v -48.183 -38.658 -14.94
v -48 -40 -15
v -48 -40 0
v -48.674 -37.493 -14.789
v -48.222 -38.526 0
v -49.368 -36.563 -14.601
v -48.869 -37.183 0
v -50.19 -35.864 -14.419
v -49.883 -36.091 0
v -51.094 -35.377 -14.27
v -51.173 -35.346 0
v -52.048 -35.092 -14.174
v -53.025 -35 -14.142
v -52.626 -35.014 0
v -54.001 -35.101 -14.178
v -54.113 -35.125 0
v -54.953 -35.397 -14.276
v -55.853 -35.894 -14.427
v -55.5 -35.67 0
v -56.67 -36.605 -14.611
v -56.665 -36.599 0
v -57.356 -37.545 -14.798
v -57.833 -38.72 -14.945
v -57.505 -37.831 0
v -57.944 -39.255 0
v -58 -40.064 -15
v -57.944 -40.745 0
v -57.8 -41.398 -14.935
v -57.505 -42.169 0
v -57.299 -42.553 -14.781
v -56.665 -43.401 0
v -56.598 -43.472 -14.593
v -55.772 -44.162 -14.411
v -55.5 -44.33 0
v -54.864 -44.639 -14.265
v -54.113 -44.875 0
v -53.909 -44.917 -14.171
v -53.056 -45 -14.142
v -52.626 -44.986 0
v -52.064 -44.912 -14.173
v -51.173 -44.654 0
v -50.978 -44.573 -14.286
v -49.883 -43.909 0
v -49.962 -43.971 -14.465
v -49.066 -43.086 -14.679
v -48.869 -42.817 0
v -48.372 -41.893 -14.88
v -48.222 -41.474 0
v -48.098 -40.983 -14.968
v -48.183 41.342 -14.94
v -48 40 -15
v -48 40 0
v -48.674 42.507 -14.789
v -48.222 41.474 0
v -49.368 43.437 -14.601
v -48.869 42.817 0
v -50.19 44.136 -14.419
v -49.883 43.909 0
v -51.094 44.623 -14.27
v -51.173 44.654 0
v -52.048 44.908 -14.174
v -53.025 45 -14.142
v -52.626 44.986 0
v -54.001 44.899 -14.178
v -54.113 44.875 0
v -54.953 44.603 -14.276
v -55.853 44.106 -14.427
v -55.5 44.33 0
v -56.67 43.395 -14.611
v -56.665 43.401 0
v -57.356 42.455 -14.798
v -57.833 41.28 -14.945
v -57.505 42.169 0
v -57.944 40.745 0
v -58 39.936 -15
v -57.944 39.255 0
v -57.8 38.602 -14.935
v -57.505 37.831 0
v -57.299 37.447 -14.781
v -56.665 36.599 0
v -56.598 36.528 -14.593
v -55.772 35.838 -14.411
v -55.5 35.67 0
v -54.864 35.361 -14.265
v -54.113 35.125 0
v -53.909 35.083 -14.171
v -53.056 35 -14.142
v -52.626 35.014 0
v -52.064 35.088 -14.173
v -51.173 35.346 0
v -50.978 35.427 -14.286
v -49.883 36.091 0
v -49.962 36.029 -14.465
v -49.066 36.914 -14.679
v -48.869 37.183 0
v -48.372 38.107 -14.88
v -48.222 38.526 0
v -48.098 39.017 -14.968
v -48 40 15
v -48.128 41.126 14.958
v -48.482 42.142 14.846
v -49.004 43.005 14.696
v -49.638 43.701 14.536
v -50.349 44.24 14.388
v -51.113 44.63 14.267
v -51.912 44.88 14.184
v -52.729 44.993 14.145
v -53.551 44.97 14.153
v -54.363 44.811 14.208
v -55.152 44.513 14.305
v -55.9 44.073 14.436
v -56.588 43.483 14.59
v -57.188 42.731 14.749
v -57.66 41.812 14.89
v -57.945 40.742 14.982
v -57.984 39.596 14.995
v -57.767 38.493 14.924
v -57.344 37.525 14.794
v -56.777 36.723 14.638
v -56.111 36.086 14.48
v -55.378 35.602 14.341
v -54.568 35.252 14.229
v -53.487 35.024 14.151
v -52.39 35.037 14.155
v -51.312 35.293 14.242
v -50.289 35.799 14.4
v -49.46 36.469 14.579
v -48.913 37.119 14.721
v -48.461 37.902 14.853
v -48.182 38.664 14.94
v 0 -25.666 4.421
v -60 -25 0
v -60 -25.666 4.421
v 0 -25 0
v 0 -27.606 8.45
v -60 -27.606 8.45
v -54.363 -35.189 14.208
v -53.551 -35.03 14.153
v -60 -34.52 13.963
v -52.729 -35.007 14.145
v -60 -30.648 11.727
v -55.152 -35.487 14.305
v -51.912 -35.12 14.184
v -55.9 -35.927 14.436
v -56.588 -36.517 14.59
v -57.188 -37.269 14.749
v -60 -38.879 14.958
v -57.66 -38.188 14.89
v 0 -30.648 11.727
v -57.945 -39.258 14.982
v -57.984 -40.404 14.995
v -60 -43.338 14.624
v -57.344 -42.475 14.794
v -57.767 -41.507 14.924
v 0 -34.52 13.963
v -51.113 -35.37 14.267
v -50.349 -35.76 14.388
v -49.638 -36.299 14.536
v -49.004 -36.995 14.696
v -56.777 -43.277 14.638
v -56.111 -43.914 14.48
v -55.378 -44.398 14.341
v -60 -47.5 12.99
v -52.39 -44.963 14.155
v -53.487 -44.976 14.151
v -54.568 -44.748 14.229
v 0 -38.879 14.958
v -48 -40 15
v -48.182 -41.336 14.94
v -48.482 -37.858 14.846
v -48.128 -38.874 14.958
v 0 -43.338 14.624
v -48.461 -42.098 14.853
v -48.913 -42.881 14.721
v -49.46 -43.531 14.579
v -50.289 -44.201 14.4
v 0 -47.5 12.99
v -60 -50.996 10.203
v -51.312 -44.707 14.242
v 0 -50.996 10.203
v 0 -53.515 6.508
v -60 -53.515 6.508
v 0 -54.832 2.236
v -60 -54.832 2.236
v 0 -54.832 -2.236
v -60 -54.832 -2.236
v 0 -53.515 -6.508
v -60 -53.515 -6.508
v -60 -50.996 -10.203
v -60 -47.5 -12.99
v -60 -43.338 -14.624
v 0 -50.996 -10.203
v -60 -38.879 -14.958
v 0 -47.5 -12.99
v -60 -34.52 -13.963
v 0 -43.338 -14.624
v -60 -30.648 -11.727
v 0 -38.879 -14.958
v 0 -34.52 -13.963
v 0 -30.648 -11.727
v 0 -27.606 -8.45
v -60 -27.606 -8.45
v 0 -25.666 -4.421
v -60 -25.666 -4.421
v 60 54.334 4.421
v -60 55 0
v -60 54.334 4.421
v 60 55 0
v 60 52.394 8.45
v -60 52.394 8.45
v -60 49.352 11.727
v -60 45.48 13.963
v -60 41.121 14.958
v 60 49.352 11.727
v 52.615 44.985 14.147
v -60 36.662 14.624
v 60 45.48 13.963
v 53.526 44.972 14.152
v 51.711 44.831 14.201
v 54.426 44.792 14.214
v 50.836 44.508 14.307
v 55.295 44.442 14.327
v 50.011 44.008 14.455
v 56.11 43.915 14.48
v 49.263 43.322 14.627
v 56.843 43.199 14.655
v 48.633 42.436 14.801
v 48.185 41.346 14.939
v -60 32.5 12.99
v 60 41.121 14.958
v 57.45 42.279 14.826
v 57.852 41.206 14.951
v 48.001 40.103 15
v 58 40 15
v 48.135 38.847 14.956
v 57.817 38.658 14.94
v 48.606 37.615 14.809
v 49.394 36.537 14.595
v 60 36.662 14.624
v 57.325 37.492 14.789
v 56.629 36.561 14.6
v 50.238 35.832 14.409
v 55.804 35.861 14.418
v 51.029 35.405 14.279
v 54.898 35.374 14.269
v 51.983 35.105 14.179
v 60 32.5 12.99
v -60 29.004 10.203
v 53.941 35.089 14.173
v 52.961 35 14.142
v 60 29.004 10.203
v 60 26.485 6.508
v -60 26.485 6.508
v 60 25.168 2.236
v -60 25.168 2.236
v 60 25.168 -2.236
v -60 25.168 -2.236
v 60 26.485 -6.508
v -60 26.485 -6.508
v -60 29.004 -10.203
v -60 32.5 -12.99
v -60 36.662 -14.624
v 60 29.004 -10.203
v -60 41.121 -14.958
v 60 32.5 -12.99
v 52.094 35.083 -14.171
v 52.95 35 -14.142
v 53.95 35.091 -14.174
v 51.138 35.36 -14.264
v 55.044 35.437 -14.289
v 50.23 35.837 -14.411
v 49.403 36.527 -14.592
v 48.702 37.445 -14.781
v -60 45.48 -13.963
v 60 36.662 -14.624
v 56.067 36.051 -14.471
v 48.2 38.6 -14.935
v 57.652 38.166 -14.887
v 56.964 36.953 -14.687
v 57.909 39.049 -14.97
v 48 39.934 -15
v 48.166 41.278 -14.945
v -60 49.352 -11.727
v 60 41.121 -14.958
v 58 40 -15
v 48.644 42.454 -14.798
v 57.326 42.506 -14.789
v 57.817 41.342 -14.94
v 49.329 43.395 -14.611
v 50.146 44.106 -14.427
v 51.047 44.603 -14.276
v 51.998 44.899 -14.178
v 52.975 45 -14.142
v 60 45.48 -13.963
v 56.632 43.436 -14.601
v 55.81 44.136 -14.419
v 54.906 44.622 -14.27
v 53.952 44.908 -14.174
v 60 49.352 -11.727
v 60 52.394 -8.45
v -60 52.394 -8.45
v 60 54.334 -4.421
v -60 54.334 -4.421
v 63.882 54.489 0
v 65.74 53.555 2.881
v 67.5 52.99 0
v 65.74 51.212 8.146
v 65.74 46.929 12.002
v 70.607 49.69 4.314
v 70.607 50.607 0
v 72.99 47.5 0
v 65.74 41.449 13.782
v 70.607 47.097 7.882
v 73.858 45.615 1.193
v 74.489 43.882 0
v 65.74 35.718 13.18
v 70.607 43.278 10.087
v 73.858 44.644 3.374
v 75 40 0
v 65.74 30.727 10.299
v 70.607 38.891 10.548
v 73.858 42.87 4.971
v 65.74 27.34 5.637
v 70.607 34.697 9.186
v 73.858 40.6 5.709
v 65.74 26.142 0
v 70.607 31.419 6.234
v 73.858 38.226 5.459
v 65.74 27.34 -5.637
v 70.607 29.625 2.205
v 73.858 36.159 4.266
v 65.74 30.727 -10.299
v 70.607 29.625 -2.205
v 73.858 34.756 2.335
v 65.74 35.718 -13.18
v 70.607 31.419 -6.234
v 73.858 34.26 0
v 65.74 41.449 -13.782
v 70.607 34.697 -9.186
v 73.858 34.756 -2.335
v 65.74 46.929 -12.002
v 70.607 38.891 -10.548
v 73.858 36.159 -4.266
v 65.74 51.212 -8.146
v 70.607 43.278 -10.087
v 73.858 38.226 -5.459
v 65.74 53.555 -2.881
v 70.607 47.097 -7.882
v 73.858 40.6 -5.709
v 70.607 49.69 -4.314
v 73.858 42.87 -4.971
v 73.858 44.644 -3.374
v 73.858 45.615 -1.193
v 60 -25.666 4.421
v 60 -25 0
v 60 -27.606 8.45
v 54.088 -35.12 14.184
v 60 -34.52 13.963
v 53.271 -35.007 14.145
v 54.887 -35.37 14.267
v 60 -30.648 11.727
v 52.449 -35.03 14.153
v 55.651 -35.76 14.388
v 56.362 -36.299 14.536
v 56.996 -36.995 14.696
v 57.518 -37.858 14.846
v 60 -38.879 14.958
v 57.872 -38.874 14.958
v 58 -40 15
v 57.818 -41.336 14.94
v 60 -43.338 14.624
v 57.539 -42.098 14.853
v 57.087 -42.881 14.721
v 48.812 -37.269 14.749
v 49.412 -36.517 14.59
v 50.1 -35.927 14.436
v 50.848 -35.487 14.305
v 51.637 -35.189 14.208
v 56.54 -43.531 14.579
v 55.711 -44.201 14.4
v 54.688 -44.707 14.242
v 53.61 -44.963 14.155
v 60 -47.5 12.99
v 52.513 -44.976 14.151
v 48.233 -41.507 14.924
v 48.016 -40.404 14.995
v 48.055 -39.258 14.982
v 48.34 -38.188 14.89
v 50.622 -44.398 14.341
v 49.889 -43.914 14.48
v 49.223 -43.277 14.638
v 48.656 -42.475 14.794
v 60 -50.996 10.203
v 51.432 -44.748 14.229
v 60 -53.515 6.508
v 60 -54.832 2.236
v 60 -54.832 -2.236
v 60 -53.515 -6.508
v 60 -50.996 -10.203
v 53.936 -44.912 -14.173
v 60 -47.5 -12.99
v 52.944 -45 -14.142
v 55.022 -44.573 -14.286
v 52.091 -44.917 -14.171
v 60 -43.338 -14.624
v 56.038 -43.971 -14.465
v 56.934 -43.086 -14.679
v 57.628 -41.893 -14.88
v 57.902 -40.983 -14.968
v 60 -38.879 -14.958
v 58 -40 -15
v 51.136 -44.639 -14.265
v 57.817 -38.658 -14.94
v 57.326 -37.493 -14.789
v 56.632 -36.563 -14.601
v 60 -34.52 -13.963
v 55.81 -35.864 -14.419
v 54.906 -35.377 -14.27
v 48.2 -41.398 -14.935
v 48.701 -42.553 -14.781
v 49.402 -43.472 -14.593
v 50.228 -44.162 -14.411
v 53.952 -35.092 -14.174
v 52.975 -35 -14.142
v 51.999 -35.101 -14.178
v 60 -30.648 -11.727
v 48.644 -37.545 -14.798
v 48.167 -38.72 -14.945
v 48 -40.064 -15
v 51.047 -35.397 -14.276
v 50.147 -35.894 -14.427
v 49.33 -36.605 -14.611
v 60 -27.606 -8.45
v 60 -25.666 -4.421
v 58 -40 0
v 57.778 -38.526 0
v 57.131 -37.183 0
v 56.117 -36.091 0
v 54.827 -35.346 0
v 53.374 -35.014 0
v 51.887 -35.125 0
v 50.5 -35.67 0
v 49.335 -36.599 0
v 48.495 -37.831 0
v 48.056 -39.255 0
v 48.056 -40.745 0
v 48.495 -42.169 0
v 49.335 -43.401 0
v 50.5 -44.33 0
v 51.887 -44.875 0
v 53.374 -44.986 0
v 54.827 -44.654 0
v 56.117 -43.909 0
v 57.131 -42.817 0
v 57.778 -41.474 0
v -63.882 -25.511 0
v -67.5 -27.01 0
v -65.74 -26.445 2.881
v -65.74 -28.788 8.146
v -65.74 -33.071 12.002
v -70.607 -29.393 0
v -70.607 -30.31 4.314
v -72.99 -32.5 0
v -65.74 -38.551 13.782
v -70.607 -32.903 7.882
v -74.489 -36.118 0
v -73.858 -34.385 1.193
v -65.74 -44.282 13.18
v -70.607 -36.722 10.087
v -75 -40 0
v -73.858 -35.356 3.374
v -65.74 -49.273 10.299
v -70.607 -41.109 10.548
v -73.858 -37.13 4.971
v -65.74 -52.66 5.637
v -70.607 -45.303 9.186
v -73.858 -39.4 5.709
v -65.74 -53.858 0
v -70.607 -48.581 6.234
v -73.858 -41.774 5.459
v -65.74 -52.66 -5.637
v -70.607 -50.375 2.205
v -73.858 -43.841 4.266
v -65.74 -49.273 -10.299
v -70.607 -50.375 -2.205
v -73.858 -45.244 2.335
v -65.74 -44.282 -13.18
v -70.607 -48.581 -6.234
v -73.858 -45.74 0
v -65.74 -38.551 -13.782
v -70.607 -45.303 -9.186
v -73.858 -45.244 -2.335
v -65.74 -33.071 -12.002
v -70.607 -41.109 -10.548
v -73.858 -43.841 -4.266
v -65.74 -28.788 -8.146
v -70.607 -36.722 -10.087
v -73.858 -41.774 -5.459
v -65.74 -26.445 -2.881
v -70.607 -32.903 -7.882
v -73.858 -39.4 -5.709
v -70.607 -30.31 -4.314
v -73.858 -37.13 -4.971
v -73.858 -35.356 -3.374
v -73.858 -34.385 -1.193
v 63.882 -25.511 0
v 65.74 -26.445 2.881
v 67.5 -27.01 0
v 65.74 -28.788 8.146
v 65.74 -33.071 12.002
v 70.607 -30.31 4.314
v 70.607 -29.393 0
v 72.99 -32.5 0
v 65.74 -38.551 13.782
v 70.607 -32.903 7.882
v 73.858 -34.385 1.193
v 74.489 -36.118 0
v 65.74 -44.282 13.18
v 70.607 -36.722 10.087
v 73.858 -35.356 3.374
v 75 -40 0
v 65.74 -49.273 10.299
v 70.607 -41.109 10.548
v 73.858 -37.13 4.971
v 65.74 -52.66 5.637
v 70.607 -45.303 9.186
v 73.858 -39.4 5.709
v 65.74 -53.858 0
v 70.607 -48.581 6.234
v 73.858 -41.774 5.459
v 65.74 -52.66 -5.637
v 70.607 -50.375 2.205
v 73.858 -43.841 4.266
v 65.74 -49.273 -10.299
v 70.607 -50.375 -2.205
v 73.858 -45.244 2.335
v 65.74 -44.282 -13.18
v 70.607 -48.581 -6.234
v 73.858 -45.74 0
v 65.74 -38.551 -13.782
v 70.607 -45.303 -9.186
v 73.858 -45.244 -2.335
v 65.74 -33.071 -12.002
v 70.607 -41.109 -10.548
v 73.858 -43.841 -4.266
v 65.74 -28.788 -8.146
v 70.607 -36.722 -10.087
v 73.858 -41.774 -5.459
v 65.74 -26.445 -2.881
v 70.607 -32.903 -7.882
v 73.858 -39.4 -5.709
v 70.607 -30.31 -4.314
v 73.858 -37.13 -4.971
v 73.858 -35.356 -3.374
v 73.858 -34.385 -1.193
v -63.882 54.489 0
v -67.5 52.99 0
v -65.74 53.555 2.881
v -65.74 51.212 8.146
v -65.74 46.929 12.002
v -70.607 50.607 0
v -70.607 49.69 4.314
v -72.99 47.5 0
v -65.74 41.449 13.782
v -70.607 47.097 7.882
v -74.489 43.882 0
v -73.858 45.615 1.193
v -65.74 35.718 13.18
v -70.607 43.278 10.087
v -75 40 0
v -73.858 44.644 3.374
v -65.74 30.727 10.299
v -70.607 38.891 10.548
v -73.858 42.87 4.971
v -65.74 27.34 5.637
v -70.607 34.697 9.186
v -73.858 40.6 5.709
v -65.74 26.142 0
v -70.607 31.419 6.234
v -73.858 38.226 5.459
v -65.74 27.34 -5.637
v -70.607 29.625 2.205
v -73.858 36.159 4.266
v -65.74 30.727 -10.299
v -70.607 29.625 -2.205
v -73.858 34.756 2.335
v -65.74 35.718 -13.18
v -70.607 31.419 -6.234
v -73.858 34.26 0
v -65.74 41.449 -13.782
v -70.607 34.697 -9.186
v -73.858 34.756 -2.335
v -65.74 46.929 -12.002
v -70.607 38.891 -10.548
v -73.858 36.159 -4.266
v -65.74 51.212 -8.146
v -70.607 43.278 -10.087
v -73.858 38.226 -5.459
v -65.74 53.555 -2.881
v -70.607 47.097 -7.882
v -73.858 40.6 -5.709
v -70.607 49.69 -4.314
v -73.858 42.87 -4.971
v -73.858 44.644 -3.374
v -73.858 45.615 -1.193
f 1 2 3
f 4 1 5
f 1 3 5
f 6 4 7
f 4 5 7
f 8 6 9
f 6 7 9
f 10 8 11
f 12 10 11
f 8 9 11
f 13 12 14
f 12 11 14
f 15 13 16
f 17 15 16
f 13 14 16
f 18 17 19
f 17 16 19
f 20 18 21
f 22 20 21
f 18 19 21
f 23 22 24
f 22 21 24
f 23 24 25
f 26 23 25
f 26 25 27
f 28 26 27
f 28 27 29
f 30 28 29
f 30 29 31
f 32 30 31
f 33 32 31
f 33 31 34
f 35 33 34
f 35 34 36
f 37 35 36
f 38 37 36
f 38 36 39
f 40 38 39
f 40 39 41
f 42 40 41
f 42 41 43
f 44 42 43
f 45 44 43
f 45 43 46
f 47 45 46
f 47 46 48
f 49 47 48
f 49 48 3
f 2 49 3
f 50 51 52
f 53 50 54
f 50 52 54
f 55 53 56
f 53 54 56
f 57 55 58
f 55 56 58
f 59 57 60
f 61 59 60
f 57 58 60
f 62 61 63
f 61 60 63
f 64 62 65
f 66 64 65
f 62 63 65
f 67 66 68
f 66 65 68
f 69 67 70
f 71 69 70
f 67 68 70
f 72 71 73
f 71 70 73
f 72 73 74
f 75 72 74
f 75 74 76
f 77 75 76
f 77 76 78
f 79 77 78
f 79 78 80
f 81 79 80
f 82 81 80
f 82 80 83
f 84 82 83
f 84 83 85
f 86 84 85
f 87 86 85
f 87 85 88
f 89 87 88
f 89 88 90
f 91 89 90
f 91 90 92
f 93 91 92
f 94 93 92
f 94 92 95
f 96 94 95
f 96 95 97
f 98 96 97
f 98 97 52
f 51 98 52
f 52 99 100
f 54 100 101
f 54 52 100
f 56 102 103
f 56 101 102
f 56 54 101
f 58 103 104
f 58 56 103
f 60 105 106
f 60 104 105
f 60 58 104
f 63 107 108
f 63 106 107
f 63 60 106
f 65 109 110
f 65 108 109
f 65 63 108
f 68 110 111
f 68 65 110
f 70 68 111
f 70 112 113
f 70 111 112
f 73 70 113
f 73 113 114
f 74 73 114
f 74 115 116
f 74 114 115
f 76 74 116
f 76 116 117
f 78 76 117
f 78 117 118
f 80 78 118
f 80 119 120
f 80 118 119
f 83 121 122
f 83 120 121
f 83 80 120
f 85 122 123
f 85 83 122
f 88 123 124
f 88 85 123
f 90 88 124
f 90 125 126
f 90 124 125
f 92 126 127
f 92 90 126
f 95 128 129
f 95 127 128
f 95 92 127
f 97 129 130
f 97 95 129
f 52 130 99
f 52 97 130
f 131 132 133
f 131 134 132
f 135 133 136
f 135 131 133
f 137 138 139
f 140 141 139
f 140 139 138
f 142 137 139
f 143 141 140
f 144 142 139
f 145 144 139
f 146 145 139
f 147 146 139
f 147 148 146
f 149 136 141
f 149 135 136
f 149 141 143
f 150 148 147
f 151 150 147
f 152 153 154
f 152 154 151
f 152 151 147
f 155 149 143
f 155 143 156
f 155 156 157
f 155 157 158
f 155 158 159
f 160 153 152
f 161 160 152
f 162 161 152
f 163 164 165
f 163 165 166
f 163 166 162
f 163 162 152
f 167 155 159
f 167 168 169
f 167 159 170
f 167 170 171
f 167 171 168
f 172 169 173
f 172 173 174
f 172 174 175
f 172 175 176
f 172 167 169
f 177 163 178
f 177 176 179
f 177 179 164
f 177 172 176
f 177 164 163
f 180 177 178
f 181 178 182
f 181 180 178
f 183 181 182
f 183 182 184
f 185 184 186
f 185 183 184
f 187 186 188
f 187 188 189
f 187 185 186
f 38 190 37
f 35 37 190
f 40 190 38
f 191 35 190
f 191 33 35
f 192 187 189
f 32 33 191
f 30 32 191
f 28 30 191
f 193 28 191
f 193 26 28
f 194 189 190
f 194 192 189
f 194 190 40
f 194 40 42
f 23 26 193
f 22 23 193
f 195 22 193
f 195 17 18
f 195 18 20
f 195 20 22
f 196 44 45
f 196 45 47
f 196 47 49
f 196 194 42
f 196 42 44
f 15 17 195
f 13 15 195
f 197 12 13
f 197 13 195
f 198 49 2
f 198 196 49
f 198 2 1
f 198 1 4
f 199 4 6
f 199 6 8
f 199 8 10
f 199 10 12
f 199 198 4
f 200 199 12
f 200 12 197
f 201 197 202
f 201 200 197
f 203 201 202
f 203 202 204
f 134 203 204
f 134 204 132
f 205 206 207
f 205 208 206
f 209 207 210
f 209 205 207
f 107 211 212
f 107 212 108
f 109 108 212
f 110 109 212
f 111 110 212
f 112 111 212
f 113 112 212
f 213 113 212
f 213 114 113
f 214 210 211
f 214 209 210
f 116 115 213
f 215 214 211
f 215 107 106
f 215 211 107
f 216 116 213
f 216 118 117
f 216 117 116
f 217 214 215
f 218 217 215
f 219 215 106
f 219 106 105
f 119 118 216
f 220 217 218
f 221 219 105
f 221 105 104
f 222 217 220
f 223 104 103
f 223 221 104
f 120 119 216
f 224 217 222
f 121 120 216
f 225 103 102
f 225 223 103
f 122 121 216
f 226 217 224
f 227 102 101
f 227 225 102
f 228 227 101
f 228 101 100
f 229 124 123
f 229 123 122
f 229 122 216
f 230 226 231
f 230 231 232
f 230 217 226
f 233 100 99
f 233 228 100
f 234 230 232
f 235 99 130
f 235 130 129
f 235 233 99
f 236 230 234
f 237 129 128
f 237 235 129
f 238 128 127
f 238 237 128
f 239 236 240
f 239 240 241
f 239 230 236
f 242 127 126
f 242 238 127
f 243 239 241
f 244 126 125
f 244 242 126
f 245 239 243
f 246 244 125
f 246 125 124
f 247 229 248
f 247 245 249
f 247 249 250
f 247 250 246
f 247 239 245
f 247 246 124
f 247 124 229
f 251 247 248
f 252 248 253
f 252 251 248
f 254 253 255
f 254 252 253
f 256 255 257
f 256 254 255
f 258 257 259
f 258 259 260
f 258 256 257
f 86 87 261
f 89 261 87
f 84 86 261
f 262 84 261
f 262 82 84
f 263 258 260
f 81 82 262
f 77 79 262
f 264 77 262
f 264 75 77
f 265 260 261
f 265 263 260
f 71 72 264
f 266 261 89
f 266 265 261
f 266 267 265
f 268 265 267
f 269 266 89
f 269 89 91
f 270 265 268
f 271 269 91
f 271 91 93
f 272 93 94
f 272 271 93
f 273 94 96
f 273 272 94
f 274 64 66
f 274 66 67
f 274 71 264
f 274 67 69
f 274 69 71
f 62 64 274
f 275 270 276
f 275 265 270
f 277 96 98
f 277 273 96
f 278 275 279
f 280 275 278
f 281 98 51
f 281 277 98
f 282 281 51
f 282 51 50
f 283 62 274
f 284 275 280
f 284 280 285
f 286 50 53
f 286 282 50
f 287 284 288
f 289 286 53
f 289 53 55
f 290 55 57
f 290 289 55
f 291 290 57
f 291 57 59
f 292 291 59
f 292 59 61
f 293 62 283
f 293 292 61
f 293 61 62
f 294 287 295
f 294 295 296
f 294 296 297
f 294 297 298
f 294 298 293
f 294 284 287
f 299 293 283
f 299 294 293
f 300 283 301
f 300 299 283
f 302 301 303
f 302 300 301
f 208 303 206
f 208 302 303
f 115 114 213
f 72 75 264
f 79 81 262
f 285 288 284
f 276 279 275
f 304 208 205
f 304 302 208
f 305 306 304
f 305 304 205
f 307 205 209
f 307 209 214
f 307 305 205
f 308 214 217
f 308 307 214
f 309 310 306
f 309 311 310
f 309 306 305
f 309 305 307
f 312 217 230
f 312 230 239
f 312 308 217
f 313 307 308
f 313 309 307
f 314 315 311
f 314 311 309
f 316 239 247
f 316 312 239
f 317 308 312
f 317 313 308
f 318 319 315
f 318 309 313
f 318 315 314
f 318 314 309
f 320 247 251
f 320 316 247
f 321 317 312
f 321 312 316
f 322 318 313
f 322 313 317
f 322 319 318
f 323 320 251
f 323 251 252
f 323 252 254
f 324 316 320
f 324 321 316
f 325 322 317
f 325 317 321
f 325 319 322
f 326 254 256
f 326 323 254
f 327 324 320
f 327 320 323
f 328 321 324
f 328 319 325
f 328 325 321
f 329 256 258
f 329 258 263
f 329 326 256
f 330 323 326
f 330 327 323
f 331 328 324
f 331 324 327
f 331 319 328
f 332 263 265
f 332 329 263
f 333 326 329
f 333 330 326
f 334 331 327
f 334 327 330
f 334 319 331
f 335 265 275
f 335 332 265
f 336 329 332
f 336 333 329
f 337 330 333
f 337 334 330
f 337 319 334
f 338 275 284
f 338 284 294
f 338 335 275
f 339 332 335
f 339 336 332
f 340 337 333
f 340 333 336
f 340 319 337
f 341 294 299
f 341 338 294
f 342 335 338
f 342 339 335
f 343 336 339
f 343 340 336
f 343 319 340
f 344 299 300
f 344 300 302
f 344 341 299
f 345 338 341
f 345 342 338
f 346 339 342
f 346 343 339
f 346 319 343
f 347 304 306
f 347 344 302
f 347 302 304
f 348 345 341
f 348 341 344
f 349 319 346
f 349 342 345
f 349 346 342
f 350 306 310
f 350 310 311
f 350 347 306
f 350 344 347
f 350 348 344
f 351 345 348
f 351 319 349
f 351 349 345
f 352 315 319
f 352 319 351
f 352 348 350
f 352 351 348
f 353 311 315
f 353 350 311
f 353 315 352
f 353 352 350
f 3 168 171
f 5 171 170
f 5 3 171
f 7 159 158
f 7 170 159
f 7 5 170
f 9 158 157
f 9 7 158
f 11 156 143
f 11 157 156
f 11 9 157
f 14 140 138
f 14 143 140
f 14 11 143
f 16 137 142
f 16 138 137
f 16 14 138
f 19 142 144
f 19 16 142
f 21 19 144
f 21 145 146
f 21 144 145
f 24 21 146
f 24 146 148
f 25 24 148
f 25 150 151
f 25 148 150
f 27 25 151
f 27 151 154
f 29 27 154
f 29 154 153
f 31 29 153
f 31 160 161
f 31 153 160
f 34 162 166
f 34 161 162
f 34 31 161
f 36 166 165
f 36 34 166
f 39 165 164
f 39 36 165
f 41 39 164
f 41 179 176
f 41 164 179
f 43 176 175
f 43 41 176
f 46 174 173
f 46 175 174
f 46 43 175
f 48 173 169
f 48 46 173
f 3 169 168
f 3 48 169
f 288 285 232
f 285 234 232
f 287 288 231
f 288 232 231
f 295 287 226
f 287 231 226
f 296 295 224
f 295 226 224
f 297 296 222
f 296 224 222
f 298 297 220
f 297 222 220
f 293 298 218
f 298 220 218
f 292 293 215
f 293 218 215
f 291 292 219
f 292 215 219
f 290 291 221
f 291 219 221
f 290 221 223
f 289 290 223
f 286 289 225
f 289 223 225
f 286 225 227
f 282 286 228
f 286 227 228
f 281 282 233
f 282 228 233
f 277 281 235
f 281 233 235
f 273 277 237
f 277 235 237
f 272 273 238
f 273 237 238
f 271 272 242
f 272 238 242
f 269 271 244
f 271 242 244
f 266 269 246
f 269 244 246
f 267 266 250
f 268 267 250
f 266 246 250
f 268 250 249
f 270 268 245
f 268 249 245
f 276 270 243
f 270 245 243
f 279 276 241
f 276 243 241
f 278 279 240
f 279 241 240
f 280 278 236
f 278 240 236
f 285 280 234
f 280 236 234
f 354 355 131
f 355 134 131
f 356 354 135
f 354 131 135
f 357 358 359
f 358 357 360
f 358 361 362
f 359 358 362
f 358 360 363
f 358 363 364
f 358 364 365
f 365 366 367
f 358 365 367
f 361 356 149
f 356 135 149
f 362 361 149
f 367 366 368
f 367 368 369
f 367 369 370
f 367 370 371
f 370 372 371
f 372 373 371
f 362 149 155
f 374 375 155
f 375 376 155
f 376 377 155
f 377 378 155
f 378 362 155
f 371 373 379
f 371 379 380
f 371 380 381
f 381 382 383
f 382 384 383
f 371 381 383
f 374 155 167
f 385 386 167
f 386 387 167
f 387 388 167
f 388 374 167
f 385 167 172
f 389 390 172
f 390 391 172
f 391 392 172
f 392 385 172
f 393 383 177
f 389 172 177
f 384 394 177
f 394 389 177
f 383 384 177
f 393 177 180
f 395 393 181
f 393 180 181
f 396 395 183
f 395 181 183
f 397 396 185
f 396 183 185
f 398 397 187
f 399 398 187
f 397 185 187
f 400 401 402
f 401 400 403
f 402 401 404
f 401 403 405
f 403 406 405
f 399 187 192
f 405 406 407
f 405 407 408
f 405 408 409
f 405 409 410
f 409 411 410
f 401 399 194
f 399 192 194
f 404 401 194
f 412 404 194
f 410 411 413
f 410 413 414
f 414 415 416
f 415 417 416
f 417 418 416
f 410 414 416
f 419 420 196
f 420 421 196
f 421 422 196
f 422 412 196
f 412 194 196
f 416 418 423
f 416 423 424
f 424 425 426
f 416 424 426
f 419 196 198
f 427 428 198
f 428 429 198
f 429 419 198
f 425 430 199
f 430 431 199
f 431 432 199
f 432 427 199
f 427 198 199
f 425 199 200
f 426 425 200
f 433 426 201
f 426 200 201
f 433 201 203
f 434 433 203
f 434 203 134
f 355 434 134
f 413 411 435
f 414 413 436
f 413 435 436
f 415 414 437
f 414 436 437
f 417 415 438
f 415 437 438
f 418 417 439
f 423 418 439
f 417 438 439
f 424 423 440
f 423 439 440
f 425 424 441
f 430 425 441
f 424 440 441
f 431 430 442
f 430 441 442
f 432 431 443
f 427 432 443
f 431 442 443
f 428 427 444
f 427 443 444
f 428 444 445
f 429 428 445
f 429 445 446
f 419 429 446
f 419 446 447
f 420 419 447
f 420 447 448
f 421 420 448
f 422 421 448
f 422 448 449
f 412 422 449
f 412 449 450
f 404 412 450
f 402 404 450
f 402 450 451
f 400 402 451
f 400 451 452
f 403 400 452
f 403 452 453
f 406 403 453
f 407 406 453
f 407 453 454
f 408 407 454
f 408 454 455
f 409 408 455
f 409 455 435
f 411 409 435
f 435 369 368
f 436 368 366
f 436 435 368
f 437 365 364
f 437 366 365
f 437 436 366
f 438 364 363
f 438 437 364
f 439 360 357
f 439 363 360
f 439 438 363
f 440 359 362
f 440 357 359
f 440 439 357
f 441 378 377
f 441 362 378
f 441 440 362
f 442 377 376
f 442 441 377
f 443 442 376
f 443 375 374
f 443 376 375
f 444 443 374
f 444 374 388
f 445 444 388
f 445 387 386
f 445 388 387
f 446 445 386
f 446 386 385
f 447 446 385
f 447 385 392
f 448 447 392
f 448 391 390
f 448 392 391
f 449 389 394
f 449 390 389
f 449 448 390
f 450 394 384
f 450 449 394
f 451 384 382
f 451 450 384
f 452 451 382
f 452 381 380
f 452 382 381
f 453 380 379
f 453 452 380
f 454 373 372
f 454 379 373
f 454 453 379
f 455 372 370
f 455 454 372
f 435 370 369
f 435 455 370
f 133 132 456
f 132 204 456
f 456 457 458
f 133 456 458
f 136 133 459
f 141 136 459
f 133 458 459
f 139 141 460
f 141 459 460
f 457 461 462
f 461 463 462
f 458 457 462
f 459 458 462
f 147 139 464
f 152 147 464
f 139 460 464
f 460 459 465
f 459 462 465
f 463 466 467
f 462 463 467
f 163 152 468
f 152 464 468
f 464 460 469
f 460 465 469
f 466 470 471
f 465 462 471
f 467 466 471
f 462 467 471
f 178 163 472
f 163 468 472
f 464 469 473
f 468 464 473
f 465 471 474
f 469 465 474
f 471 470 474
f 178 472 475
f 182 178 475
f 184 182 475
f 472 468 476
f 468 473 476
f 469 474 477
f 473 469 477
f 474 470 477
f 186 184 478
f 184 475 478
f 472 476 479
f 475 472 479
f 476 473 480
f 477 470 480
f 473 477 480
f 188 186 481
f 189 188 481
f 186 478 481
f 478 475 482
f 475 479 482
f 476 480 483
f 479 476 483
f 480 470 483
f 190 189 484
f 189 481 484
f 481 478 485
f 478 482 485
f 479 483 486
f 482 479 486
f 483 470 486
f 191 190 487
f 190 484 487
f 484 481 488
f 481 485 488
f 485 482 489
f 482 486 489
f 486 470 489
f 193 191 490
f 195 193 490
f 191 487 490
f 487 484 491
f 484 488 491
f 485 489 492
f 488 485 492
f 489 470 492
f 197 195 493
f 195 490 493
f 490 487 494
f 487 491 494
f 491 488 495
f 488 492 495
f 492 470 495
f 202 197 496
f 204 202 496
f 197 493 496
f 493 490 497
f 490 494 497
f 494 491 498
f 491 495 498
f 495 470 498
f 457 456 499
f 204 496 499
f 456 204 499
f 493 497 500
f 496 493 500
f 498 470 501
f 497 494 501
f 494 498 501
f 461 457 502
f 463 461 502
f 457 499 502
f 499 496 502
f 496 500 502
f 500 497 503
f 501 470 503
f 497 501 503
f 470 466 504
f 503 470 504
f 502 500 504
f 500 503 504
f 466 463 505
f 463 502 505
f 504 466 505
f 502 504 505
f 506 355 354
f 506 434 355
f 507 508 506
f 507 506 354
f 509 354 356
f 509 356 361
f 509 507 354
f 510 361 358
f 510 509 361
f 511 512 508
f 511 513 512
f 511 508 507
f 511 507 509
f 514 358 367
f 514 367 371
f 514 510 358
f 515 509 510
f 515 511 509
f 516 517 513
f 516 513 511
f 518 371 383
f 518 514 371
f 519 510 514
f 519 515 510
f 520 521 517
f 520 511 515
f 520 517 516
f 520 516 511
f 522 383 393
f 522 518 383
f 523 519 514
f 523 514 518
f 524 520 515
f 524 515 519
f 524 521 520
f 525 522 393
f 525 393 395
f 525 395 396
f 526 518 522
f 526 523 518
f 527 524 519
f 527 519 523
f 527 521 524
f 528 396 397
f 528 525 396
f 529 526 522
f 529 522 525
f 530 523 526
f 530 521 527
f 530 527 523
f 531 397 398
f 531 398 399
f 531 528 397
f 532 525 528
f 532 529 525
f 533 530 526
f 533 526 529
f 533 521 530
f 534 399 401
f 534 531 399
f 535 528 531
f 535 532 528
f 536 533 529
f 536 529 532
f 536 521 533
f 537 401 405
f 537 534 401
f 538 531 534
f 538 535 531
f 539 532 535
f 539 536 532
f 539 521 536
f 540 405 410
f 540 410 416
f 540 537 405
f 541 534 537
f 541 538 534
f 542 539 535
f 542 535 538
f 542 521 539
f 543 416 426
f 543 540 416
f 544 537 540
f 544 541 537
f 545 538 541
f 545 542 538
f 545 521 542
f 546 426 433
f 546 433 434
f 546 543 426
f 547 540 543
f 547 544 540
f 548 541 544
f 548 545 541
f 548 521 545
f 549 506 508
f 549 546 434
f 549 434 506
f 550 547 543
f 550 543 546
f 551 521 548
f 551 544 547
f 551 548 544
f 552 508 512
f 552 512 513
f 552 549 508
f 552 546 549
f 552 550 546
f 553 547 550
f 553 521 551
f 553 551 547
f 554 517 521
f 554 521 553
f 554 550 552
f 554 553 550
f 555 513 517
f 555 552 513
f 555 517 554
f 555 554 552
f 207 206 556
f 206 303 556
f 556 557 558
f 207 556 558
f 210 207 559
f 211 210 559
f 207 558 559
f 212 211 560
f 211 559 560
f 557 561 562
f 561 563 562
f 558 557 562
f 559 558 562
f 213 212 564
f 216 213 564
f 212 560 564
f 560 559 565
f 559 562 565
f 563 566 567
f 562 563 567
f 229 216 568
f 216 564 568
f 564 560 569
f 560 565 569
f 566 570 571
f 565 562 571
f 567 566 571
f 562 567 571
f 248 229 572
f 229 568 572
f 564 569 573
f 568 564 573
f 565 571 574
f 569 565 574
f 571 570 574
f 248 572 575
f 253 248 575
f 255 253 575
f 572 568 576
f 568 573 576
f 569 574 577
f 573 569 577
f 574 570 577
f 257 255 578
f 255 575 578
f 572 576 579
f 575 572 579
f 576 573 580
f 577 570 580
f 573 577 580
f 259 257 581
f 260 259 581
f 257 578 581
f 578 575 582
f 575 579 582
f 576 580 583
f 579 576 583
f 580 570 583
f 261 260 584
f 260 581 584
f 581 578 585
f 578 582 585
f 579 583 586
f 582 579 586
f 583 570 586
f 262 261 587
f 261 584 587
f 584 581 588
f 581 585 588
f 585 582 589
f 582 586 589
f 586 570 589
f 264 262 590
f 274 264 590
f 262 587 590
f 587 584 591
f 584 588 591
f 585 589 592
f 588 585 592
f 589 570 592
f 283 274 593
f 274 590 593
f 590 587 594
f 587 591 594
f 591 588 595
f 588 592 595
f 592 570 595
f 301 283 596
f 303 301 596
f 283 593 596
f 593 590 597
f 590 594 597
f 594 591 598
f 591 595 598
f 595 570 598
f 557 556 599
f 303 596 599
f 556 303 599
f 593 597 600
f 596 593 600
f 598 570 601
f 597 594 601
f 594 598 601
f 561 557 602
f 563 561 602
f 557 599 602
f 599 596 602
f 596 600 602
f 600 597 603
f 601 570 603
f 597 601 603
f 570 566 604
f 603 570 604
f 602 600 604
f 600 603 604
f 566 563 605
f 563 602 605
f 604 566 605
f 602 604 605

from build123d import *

# Parameters (mm, degrees)
F0_R     = 15
F1_DEPTH = 75
F2_R     = 15
F3_R     = 5
F4_DEPTH = 15


with BuildPart() as f1:
    # F0 (on Right) → F1 (new body, symmetric)
    with BuildSketch(Plane.YZ):
        with Locations((-40, 0)):
            Circle(F0_R)
        with Locations((40, 0)):
            Circle(F0_R)
    extrude(amount=F1_DEPTH, both=True)

    # F2
    f2_edges = [f1.edges().sort_by_distance(p)[0] for p in [
        (75, -55, 0),
        (75, 25, 0),
        (-75, -55, 0),
        (-75, 25, 0),
    ]]
    fillet(f2_edges, radius=F2_R)

    # F3 (on Top) → F4 (cut, symmetric)
    with BuildSketch(Plane.XY):
        with Locations((-53, 40)):
            Circle(F3_R)
        with Locations((-53, -40)):
            Circle(F3_R)
        with Locations((53, -40)):
            Circle(F3_R)
        with Locations((53, 40)):
            Circle(F3_R)
    extrude(amount=F4_DEPTH, both=True, mode=Mode.SUBTRACT)


solid = f1.part
